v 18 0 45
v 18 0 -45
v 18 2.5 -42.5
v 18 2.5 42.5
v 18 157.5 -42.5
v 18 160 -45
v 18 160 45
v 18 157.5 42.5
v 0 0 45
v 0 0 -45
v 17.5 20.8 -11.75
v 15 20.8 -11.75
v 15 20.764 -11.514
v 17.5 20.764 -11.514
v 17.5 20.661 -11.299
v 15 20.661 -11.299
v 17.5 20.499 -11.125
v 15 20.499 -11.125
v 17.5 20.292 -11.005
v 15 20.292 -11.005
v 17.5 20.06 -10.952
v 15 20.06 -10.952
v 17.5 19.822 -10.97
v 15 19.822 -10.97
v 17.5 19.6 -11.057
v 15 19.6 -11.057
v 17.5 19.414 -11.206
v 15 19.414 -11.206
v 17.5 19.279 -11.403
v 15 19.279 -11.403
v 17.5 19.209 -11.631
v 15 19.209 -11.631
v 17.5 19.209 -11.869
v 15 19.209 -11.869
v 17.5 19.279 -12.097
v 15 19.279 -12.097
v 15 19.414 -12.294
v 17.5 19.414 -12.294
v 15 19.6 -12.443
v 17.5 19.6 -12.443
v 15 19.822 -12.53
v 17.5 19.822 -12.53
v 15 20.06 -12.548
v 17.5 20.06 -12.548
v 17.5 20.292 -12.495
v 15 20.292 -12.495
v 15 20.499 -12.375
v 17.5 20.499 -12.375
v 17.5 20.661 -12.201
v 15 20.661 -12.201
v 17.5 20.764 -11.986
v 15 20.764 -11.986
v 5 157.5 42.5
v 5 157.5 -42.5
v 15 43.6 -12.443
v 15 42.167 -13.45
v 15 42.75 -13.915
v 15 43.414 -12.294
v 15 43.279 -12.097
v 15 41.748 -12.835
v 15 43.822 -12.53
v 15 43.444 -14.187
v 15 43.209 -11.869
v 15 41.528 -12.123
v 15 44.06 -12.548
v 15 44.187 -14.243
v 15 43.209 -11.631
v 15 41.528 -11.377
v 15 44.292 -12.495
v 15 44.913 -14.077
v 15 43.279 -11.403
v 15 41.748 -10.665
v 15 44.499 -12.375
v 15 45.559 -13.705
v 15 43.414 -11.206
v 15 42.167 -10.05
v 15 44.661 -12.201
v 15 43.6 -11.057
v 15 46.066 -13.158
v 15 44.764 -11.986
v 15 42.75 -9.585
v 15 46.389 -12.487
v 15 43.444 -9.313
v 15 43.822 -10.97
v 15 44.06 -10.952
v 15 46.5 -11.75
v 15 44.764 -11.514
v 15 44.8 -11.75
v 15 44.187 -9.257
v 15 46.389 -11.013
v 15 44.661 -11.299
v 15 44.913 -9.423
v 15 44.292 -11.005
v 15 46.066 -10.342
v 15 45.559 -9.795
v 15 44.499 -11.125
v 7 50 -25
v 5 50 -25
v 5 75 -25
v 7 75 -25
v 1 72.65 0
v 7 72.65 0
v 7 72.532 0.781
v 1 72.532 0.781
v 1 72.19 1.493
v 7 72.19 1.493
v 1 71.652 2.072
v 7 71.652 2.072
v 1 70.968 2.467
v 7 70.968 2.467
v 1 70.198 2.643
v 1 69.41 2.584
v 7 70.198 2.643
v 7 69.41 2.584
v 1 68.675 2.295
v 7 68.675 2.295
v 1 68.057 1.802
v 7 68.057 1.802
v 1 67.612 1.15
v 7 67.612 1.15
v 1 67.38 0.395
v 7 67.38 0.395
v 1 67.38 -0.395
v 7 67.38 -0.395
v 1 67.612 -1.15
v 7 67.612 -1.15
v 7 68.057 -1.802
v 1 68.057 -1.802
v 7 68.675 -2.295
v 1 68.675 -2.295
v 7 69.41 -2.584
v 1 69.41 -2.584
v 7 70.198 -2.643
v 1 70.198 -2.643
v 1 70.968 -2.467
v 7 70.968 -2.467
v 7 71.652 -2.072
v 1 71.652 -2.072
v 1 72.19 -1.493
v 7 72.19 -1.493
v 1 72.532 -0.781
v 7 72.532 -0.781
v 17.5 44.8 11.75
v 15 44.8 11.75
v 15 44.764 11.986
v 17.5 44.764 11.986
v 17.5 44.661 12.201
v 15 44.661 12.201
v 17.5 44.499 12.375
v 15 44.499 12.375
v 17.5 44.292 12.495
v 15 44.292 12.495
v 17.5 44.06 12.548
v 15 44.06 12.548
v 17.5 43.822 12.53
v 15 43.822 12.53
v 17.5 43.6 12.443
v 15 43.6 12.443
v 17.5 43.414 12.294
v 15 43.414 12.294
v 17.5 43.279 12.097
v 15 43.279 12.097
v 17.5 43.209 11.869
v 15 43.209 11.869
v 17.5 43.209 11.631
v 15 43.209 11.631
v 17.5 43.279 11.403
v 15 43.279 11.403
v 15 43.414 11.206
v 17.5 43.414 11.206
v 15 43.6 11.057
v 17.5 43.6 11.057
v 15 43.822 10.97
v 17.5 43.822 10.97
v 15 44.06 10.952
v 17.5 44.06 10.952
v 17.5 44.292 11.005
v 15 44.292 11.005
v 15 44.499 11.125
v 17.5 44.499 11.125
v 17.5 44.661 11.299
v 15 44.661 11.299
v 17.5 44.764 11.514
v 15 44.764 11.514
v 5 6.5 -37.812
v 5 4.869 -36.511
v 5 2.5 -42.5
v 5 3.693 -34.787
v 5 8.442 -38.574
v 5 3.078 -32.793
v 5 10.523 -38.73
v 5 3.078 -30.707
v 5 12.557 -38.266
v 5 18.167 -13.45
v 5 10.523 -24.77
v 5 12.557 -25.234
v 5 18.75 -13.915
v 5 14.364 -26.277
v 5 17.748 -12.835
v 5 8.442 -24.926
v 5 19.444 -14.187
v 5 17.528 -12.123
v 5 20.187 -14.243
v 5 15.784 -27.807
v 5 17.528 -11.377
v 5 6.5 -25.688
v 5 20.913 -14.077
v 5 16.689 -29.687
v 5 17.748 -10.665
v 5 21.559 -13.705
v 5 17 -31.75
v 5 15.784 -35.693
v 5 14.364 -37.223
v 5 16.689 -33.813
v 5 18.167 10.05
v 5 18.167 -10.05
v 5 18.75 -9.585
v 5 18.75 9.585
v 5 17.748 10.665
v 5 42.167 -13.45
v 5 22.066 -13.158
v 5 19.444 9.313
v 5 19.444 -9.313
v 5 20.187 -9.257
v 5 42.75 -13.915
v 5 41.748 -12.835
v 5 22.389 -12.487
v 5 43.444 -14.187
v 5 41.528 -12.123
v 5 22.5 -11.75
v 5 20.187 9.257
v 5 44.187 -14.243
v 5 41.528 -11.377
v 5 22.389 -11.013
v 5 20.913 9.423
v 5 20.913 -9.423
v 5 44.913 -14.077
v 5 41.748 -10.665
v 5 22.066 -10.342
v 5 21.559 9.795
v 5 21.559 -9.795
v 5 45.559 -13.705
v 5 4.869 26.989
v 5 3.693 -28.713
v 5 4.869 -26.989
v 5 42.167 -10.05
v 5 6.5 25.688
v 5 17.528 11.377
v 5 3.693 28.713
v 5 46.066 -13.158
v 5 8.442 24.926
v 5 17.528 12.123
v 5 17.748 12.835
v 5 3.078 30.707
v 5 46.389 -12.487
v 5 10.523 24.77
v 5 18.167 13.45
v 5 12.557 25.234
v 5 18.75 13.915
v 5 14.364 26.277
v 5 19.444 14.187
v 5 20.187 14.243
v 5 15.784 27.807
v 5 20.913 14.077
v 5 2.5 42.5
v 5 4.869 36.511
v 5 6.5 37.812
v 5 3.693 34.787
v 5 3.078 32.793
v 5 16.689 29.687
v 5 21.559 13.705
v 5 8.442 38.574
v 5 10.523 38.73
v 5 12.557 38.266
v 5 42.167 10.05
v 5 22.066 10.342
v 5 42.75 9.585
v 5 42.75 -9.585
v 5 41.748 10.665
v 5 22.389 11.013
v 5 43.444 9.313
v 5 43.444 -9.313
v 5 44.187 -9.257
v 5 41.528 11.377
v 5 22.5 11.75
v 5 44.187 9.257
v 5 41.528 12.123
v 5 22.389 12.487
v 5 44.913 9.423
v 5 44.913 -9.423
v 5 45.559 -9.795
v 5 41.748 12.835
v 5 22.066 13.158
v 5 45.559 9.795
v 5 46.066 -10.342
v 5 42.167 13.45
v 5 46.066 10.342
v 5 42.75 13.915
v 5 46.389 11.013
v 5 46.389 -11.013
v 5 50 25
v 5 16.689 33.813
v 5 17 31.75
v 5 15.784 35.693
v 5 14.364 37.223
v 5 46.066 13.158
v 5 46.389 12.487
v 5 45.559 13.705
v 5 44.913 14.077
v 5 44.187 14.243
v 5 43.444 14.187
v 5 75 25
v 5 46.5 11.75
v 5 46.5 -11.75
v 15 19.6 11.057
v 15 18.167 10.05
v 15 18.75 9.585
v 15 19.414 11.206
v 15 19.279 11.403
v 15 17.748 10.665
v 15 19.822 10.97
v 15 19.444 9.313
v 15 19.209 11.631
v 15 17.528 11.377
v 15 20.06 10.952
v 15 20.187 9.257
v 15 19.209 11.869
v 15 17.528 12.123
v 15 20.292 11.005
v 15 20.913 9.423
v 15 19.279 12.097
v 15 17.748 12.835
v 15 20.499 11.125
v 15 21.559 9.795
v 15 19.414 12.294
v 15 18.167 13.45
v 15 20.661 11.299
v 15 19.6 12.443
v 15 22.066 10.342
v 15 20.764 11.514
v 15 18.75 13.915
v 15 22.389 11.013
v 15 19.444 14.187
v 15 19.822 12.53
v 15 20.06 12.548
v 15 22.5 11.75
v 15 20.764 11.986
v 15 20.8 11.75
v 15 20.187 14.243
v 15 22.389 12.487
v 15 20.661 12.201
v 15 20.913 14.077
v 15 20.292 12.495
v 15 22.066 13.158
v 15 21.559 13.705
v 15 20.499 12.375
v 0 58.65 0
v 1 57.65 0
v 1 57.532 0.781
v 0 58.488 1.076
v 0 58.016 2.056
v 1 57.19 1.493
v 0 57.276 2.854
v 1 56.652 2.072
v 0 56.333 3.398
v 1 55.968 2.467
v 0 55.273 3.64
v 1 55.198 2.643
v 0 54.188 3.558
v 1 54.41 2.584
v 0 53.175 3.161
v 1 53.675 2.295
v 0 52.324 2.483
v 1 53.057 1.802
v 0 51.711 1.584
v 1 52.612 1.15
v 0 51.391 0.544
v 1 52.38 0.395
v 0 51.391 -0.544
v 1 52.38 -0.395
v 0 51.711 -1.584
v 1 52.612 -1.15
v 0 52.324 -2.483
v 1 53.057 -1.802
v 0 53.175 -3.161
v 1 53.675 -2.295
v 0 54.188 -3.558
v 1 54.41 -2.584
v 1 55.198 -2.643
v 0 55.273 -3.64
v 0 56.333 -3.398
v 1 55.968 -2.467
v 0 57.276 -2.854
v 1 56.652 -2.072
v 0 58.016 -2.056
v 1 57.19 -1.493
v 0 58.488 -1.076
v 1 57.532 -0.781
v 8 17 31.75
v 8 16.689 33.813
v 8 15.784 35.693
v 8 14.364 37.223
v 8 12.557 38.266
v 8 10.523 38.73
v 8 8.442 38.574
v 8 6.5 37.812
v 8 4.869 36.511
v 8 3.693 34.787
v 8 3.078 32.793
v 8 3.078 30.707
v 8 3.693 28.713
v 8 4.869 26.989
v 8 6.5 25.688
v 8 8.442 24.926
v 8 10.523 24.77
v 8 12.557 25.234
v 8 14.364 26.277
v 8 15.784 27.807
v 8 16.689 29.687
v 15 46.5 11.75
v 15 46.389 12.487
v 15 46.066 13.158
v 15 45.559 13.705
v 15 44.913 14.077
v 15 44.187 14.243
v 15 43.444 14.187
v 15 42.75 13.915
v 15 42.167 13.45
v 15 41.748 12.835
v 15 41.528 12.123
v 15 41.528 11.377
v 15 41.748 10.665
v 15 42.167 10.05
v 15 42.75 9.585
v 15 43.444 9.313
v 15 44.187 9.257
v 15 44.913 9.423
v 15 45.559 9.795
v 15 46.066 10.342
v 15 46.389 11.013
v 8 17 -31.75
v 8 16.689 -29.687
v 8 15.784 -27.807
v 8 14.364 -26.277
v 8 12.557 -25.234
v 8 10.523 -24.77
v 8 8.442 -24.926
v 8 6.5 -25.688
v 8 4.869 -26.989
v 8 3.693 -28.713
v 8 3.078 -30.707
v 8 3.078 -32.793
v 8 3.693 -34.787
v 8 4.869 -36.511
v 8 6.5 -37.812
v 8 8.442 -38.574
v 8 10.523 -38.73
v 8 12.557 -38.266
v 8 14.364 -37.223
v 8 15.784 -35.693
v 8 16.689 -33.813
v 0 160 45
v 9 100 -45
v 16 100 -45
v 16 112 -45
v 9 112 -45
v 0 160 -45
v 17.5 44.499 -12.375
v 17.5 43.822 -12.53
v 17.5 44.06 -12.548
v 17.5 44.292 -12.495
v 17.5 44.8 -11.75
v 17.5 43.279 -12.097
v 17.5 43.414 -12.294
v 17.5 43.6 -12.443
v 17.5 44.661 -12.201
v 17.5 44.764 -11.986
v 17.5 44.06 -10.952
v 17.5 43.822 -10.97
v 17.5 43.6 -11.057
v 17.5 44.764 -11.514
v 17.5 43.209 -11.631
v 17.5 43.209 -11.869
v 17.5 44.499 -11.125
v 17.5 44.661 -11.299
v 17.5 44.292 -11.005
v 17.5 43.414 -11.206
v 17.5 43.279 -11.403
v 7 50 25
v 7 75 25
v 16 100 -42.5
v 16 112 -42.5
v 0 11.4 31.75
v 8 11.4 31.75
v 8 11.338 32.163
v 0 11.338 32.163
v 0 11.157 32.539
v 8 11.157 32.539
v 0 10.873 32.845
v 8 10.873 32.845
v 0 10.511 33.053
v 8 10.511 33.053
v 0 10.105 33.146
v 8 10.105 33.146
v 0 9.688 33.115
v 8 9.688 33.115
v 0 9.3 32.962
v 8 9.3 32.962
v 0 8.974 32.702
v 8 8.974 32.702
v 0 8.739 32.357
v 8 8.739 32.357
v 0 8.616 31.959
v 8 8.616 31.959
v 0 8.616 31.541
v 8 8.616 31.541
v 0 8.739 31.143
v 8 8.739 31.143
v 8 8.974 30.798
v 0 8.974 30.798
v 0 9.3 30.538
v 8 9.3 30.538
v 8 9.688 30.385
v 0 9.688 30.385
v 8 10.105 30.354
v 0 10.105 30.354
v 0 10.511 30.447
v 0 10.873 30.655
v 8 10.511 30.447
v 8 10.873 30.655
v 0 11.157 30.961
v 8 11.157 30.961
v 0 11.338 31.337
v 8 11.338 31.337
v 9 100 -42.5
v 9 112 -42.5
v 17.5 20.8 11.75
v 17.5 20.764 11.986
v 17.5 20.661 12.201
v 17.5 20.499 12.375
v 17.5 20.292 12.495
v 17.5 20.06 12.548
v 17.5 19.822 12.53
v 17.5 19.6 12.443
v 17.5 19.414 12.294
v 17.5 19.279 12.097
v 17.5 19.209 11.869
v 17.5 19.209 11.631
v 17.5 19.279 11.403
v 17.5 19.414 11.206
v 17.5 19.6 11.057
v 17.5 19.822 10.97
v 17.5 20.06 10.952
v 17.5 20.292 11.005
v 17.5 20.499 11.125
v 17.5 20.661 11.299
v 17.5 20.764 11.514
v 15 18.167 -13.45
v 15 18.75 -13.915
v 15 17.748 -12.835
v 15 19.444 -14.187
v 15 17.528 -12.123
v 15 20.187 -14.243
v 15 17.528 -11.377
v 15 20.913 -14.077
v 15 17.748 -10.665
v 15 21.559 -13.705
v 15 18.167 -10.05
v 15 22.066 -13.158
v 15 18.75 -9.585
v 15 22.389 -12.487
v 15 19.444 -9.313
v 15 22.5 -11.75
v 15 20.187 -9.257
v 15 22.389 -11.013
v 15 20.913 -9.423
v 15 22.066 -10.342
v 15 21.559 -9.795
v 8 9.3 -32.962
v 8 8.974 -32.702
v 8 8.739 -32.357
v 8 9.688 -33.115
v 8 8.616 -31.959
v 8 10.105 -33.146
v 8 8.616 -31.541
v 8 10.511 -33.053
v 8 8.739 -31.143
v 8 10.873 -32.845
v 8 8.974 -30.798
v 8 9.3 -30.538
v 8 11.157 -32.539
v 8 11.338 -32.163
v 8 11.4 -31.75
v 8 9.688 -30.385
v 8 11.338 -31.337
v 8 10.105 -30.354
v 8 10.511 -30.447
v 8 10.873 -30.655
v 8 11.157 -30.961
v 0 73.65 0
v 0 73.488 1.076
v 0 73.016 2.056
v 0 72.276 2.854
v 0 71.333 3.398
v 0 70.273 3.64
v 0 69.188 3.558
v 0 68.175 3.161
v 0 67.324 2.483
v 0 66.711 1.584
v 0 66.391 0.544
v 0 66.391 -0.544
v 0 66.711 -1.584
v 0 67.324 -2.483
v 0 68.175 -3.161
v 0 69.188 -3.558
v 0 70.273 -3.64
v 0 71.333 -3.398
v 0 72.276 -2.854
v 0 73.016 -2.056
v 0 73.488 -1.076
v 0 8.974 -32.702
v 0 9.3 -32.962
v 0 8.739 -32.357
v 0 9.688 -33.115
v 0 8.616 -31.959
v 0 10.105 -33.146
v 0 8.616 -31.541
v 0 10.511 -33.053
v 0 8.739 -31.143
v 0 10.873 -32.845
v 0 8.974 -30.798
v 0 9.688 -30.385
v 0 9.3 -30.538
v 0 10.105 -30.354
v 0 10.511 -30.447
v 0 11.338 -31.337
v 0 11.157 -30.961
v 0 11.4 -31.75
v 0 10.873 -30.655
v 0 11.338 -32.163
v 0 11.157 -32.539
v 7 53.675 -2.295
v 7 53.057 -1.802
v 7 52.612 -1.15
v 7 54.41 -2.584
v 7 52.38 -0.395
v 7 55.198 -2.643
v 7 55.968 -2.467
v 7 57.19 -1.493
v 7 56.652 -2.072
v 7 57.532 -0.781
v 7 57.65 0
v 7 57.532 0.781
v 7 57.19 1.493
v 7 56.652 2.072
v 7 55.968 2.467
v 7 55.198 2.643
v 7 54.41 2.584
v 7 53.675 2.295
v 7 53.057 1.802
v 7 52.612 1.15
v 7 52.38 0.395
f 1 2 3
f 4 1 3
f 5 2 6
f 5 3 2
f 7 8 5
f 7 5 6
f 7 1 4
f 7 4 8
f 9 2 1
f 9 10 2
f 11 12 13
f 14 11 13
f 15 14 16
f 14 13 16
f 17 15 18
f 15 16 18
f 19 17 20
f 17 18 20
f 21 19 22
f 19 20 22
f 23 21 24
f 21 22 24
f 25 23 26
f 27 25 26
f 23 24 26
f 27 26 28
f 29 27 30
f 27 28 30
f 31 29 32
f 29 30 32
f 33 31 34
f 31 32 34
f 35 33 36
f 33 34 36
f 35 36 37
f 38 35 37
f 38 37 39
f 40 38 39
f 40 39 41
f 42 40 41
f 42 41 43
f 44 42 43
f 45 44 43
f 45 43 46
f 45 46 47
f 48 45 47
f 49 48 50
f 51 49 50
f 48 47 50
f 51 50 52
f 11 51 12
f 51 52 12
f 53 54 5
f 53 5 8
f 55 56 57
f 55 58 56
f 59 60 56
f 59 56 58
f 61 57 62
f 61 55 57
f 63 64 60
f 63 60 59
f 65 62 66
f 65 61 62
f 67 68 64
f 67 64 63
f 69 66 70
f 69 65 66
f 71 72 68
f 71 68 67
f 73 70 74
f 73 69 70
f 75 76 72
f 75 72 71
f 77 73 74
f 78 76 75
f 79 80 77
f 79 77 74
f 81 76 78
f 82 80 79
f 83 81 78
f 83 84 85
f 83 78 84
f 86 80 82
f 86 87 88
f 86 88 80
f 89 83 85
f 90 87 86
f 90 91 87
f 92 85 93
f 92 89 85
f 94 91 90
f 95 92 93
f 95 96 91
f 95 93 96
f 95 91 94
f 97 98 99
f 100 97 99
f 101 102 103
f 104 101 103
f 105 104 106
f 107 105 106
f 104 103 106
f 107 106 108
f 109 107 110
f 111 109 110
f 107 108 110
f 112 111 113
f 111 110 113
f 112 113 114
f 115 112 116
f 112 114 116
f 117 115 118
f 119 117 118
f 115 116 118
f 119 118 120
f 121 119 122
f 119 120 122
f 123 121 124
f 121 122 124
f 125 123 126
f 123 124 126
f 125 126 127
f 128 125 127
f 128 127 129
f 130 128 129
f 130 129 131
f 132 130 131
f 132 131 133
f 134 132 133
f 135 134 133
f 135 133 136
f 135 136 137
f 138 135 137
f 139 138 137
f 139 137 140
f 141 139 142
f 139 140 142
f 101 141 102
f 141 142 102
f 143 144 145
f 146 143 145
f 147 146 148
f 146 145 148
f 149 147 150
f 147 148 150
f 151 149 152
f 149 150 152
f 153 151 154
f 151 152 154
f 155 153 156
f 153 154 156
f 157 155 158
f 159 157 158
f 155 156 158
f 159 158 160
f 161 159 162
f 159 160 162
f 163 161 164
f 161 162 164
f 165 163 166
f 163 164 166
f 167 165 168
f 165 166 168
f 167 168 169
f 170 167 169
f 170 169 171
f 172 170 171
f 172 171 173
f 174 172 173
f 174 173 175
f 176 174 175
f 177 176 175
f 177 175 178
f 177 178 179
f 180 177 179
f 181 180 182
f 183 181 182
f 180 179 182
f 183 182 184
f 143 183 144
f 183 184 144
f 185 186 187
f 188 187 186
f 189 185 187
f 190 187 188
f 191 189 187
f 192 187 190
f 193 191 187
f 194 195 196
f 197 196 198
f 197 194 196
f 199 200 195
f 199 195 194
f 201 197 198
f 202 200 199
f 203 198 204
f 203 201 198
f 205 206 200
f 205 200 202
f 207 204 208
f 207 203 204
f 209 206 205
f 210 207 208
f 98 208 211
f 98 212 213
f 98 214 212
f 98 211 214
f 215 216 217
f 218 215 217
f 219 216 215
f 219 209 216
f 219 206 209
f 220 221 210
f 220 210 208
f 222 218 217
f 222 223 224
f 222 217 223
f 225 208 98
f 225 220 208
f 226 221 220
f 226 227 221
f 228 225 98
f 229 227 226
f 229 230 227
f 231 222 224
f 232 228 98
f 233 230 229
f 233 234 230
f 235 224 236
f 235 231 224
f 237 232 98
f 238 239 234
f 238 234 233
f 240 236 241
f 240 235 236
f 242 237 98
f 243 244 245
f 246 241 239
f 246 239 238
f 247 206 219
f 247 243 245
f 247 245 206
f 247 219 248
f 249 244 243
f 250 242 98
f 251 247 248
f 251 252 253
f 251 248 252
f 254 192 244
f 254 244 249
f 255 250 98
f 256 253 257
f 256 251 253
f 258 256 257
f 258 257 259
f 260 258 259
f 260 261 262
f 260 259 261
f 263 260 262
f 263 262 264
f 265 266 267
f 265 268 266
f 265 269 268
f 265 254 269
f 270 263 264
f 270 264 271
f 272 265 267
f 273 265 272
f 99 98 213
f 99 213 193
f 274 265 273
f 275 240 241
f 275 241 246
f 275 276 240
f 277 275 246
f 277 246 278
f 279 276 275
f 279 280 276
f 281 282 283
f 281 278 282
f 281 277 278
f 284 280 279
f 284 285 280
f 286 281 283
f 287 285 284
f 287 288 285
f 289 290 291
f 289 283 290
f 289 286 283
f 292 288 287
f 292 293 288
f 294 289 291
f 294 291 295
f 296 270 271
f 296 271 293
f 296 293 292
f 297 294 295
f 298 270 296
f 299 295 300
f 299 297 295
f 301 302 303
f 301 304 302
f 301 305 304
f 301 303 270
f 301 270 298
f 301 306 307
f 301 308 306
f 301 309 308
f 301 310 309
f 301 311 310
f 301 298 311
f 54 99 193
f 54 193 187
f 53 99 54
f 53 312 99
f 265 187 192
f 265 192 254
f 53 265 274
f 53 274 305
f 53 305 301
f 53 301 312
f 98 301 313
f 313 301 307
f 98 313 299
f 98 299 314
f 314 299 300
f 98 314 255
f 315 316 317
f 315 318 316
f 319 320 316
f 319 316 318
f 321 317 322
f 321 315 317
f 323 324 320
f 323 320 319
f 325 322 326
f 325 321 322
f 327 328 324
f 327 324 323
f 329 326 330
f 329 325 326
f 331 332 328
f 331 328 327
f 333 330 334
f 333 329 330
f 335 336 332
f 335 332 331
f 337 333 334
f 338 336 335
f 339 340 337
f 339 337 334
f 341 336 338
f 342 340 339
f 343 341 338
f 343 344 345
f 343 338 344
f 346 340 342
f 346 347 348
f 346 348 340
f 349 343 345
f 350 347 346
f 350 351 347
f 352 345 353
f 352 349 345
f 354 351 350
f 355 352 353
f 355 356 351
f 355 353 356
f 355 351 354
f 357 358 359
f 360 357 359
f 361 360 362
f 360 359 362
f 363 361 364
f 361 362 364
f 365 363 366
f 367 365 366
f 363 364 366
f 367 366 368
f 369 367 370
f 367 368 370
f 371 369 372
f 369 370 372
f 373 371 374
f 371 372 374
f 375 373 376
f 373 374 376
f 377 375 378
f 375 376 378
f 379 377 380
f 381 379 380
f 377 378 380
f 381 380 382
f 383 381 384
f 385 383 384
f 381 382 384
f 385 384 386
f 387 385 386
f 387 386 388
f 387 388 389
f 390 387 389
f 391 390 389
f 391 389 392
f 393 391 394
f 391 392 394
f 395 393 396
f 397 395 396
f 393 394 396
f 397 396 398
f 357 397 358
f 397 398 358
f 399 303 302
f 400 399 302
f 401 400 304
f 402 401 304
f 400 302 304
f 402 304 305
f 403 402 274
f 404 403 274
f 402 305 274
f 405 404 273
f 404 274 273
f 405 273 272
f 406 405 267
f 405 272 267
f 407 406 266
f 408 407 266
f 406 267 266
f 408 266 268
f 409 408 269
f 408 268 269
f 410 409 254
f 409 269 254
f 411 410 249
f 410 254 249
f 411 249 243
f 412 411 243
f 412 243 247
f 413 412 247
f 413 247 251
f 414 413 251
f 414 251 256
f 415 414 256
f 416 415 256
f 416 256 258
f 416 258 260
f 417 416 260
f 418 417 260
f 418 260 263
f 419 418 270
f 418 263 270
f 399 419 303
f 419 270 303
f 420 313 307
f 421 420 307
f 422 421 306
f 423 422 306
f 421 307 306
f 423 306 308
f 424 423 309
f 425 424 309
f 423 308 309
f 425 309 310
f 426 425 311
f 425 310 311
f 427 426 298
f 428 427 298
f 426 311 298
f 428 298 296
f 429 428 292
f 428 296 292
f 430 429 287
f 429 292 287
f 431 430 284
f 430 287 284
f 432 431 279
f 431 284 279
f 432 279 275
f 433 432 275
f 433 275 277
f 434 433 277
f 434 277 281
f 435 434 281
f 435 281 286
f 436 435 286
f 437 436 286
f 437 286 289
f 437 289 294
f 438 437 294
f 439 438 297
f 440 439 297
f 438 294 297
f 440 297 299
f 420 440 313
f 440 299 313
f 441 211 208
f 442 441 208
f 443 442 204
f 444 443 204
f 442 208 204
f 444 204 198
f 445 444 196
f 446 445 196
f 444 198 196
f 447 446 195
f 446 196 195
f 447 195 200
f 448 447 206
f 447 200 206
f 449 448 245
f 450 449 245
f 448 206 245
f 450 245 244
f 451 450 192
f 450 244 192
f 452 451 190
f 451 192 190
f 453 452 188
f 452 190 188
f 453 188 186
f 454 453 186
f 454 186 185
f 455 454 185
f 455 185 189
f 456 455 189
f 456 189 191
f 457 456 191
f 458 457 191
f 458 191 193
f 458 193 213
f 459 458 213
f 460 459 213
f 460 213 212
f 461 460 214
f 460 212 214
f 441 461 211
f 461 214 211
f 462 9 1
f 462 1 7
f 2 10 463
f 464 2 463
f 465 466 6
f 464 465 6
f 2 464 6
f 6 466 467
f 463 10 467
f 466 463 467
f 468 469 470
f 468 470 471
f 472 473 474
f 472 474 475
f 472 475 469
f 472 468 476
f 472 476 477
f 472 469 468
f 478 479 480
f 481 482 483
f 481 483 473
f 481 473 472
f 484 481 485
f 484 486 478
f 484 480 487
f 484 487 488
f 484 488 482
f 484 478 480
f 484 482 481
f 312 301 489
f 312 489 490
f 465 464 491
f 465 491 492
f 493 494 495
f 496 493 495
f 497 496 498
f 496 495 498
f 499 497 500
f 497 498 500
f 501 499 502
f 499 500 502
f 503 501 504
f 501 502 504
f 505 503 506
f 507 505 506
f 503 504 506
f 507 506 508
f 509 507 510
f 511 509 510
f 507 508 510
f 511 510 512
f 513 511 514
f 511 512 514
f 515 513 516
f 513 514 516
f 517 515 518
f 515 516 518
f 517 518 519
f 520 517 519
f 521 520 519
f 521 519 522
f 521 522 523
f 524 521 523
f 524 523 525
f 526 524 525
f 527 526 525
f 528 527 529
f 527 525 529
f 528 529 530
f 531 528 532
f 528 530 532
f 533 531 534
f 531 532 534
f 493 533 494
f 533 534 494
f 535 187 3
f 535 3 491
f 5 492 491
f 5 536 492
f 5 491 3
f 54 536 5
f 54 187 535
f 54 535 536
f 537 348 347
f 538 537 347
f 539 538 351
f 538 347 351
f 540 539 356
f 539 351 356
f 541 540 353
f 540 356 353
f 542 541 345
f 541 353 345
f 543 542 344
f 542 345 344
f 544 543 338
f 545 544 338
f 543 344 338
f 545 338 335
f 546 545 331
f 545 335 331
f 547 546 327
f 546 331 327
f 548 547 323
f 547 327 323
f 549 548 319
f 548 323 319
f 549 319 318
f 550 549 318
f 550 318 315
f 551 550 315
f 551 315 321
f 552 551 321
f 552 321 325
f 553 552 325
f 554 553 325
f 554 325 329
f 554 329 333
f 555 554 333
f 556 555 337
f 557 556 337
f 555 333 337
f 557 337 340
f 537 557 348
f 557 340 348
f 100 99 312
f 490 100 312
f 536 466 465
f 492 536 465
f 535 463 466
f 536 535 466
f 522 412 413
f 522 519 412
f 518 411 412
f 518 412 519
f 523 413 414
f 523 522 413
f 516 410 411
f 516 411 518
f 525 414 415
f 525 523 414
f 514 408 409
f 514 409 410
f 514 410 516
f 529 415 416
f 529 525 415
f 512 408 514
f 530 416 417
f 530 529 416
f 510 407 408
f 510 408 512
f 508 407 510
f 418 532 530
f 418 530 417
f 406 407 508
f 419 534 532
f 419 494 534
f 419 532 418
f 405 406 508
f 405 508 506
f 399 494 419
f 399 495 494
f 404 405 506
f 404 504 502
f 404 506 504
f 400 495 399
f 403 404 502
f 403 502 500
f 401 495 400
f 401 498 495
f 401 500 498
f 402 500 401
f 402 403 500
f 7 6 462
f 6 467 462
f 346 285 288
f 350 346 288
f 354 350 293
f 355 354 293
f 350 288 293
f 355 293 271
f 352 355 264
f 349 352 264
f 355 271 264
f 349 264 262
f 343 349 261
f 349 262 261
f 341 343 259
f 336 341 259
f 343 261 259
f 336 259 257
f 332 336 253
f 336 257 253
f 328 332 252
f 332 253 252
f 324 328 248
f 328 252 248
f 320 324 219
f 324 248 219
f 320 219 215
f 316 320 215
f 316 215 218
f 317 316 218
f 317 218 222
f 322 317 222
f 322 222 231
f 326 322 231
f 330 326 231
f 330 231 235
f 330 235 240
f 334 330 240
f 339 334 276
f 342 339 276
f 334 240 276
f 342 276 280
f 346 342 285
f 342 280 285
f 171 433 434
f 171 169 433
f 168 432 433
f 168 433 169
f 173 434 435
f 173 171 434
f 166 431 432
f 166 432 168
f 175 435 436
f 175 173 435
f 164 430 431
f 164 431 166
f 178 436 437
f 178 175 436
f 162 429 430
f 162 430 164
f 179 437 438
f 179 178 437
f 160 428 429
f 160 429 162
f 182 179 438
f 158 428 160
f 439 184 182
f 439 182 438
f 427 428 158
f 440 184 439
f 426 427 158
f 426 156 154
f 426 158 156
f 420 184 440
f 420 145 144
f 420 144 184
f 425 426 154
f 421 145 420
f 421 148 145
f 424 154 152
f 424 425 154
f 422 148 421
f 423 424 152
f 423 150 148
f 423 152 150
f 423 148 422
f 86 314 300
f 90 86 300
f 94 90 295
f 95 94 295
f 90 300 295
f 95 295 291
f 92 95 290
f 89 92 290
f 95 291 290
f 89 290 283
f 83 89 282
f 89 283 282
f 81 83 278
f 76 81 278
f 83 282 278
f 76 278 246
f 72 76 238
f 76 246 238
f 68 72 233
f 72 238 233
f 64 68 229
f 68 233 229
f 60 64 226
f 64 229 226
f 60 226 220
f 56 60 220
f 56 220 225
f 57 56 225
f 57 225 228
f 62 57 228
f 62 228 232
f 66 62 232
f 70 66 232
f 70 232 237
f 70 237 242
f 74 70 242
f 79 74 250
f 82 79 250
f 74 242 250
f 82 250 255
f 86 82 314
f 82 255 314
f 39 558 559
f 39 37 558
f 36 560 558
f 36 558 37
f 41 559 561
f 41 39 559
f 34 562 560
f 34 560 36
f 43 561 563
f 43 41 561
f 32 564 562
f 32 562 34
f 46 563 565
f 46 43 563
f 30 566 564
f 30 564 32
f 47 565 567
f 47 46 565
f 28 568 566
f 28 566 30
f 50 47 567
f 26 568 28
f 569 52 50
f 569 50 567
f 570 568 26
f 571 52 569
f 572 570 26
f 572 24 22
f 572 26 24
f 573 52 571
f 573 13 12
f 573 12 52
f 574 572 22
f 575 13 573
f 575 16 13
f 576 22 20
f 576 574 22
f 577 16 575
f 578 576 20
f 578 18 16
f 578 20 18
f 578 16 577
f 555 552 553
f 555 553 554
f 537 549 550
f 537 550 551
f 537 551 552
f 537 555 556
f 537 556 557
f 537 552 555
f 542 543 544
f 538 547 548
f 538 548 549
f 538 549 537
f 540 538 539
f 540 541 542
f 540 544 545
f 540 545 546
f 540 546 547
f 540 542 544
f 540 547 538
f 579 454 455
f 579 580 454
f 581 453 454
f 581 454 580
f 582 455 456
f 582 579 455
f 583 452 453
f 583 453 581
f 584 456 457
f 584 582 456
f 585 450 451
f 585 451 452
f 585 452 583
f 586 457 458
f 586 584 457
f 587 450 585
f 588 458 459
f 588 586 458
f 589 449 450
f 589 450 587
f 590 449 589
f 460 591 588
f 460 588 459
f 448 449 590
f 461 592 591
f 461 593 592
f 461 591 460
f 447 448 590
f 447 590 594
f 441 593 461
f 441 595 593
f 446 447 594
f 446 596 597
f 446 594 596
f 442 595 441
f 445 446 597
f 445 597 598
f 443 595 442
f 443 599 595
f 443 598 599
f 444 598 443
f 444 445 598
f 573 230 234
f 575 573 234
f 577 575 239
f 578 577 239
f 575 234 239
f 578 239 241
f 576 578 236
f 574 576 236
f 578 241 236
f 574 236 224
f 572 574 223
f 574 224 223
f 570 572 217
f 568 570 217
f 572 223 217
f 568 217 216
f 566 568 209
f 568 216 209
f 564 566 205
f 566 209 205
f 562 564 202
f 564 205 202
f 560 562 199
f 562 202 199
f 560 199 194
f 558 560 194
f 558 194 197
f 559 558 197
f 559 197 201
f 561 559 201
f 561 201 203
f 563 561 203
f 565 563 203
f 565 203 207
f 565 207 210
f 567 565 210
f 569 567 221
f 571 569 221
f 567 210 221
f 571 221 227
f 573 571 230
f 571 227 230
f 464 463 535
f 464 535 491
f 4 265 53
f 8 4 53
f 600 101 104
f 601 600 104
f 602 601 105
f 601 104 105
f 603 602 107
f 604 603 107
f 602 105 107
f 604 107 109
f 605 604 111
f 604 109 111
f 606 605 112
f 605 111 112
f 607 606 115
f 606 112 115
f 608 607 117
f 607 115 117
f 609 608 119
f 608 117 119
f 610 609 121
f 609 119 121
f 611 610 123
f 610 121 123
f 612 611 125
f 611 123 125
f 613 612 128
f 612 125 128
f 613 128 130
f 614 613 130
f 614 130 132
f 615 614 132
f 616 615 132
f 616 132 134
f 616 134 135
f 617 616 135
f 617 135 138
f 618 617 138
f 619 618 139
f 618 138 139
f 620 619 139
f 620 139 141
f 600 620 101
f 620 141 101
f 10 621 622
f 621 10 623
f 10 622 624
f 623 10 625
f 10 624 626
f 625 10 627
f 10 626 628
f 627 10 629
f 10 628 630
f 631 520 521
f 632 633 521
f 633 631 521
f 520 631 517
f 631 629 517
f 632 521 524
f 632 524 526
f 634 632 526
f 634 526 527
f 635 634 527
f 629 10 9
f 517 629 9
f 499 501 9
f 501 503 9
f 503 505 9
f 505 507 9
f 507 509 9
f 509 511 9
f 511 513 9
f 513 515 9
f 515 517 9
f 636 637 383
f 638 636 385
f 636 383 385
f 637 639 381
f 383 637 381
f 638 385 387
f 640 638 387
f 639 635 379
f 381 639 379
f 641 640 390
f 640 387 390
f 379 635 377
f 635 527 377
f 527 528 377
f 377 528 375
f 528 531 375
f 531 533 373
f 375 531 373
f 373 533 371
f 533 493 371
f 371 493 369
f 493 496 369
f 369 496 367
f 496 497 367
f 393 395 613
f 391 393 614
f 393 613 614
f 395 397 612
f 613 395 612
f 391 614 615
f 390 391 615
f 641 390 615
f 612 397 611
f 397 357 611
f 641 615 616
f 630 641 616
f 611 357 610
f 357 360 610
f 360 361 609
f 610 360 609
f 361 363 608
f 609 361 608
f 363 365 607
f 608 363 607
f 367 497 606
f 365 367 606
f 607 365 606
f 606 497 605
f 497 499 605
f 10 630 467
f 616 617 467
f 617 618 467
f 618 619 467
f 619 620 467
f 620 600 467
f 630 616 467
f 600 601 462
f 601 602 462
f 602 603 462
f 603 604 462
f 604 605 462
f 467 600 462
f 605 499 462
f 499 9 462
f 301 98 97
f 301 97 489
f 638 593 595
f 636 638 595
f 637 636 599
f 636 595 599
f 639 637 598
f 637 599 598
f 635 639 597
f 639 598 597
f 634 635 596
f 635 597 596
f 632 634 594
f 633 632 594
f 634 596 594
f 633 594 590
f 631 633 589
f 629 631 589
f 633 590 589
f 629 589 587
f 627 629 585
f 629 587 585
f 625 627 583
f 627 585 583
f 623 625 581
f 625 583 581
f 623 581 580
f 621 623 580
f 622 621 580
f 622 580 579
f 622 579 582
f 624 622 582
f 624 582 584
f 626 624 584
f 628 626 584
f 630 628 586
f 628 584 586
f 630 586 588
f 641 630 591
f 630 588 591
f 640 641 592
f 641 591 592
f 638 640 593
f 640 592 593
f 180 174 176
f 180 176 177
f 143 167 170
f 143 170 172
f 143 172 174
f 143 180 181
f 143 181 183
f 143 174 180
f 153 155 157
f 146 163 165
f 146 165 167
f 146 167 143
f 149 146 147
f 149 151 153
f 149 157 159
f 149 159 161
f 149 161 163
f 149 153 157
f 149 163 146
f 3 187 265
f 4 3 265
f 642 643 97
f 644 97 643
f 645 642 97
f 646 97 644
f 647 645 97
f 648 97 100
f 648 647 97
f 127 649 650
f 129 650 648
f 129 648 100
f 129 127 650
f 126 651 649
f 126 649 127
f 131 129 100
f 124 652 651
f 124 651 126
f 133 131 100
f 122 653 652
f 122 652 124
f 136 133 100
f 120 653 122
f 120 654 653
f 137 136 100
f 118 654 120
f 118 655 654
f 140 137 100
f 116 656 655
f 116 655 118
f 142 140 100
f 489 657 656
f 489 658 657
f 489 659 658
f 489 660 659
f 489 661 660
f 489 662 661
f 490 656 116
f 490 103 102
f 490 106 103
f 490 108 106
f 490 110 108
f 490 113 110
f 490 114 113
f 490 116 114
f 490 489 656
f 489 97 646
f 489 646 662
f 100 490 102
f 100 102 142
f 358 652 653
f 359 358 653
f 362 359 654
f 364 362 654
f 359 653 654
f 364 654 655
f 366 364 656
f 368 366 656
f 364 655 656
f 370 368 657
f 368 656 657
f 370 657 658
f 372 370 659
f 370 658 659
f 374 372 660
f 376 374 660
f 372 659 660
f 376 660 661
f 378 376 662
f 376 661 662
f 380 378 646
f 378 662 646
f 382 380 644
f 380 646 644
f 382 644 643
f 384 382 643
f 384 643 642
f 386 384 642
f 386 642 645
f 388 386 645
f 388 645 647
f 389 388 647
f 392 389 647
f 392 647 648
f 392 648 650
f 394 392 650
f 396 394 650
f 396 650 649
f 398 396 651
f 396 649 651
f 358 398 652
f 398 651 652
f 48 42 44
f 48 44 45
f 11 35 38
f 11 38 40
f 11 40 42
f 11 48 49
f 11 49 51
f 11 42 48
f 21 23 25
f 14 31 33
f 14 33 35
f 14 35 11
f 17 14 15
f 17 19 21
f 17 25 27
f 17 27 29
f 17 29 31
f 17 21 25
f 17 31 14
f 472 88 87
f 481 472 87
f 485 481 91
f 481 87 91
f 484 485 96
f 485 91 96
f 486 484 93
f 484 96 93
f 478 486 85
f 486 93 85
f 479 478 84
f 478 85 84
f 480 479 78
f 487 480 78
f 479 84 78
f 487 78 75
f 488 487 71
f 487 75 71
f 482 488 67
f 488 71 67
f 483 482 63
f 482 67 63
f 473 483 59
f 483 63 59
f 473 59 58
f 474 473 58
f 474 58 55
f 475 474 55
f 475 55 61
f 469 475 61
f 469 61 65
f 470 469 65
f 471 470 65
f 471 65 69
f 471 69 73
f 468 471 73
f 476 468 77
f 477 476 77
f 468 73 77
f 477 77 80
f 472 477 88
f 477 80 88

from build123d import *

# Parameters (mm, degrees)
SKETCH_W        = 160
SKETCH_H        = 90
PAD_DEPTH       = 5
SKETCH001_R     = 7
PAD001_DEPTH    = 3
SKETCH002_R     = 2.5
PAD002_DEPTH    = 10
SKETCH003_R     = 0.8
PAD003_DEPTH    = 2.5
SKETCH004_R     = 1.4
POCKET_DEPTH    = 8
SKETCH005_W     = 25
SKETCH005_H     = 50
PAD004_DEPTH    = 2
SKETCH006_R     = 2.65
POCKET001_DEPTH = 7
CHAMFER_SIZE    = 1
CHAMFER001_SIZE = 1
SKETCH007_W     = 160
SKETCH007_H     = 90
SKETCH007_W_2   = 155
SKETCH007_H_2   = 85
PAD005_DEPTH    = 13
SKETCH008_W     = 12
SKETCH008_H     = 7
POCKET002_DEPTH = 5


with BuildPart() as part:
    # Sketch → Pad (new body)
    with BuildSketch(Plane.YZ):
        with Locations((80, 0)):
            Rectangle(SKETCH_W, SKETCH_H)
    extrude(amount=PAD_DEPTH)

    # Sketch001 (on Face6 of Pad) → Pad001 (join)
    with BuildSketch(Plane.YZ.offset(5)):
        with Locations((10, 31.75)):
            Circle(SKETCH001_R)
        with Locations((10, -31.75)):
            Circle(SKETCH001_R)
    extrude(amount=PAD001_DEPTH)

    # Sketch002 (on Face5 of Pad001) → Pad002 (join)
    with BuildSketch(Plane.YZ.offset(5)):
        with Locations((20, 11.75)):
            Circle(SKETCH002_R)
        with Locations((44, 11.75)):
            Circle(SKETCH002_R)
        with Locations((20, -11.75)):
            Circle(SKETCH002_R)
        with Locations((44, -11.75)):
            Circle(SKETCH002_R)
    extrude(amount=PAD002_DEPTH)

    # Sketch003 (on Face13 of Pad002) → Pad003 (join)
    with BuildSketch(Plane.YZ.offset(15)):
        with Locations((44, 11.75)):
            Circle(SKETCH003_R)
        with Locations((20, 11.75)):
            Circle(SKETCH003_R)
        with Locations((20, -11.75)):
            Circle(SKETCH003_R)
        with Locations((44, -11.75)):
            Circle(SKETCH003_R)
    extrude(amount=PAD003_DEPTH)

    # Sketch004 (on Face16 of Pad003) → Pocket (cut)
    with BuildSketch(Plane.YZ.offset(8)):
        with Locations((10, 31.75)):
            Circle(SKETCH004_R)
        with Locations((10, -31.75)):
            Circle(SKETCH004_R)
    extrude(amount=-POCKET_DEPTH, mode=Mode.SUBTRACT)

    # Sketch005 (on Face5 of Pocket) → Pad004 (join)
    with BuildSketch(Plane.YZ.offset(5)):
        with Locations((62.5, 0)):
            Rectangle(SKETCH005_W, SKETCH005_H)
    extrude(amount=PAD004_DEPTH)

    # Sketch006 (on Face21 of Pad004) → Pocket001 (cut)
    with BuildSketch(Plane.YZ.offset(7)):
        with Locations((55, 0)):
            Circle(SKETCH006_R)
        with Locations((70, 0)):
            Circle(SKETCH006_R)
    extrude(amount=-POCKET001_DEPTH, mode=Mode.SUBTRACT)

    # Chamfer
    chamfer_edges = [part.edges().sort_by_distance(p)[0] for p in [
        (0, 52.35, 0),
    ]]
    chamfer(chamfer_edges, length=CHAMFER_SIZE)

    # Chamfer001
    chamfer001_edges = [part.edges().sort_by_distance(p)[0] for p in [
        (0, 67.35, 0),
    ]]
    chamfer(chamfer001_edges, length=CHAMFER001_SIZE)

    # Sketch007 (on Face12 of Chamfer001) → Pad005 (join)
    with BuildSketch(Plane.YZ.offset(5)):
        with Locations((80, 0)):
            Rectangle(SKETCH007_W, SKETCH007_H)
        with Locations((80, 0)):
            Rectangle(SKETCH007_W_2, SKETCH007_H_2, mode=Mode.SUBTRACT)
    extrude(amount=PAD005_DEPTH)

    # Sketch008 (on Face42 of Pad005) → Pocket002 (cut)
    with BuildSketch(Plane.YX.offset(45)):
        with Locations((106, 12.5)):
            Rectangle(SKETCH008_W, SKETCH008_H)
    extrude(amount=-POCKET002_DEPTH, mode=Mode.SUBTRACT)


solid = part.part
